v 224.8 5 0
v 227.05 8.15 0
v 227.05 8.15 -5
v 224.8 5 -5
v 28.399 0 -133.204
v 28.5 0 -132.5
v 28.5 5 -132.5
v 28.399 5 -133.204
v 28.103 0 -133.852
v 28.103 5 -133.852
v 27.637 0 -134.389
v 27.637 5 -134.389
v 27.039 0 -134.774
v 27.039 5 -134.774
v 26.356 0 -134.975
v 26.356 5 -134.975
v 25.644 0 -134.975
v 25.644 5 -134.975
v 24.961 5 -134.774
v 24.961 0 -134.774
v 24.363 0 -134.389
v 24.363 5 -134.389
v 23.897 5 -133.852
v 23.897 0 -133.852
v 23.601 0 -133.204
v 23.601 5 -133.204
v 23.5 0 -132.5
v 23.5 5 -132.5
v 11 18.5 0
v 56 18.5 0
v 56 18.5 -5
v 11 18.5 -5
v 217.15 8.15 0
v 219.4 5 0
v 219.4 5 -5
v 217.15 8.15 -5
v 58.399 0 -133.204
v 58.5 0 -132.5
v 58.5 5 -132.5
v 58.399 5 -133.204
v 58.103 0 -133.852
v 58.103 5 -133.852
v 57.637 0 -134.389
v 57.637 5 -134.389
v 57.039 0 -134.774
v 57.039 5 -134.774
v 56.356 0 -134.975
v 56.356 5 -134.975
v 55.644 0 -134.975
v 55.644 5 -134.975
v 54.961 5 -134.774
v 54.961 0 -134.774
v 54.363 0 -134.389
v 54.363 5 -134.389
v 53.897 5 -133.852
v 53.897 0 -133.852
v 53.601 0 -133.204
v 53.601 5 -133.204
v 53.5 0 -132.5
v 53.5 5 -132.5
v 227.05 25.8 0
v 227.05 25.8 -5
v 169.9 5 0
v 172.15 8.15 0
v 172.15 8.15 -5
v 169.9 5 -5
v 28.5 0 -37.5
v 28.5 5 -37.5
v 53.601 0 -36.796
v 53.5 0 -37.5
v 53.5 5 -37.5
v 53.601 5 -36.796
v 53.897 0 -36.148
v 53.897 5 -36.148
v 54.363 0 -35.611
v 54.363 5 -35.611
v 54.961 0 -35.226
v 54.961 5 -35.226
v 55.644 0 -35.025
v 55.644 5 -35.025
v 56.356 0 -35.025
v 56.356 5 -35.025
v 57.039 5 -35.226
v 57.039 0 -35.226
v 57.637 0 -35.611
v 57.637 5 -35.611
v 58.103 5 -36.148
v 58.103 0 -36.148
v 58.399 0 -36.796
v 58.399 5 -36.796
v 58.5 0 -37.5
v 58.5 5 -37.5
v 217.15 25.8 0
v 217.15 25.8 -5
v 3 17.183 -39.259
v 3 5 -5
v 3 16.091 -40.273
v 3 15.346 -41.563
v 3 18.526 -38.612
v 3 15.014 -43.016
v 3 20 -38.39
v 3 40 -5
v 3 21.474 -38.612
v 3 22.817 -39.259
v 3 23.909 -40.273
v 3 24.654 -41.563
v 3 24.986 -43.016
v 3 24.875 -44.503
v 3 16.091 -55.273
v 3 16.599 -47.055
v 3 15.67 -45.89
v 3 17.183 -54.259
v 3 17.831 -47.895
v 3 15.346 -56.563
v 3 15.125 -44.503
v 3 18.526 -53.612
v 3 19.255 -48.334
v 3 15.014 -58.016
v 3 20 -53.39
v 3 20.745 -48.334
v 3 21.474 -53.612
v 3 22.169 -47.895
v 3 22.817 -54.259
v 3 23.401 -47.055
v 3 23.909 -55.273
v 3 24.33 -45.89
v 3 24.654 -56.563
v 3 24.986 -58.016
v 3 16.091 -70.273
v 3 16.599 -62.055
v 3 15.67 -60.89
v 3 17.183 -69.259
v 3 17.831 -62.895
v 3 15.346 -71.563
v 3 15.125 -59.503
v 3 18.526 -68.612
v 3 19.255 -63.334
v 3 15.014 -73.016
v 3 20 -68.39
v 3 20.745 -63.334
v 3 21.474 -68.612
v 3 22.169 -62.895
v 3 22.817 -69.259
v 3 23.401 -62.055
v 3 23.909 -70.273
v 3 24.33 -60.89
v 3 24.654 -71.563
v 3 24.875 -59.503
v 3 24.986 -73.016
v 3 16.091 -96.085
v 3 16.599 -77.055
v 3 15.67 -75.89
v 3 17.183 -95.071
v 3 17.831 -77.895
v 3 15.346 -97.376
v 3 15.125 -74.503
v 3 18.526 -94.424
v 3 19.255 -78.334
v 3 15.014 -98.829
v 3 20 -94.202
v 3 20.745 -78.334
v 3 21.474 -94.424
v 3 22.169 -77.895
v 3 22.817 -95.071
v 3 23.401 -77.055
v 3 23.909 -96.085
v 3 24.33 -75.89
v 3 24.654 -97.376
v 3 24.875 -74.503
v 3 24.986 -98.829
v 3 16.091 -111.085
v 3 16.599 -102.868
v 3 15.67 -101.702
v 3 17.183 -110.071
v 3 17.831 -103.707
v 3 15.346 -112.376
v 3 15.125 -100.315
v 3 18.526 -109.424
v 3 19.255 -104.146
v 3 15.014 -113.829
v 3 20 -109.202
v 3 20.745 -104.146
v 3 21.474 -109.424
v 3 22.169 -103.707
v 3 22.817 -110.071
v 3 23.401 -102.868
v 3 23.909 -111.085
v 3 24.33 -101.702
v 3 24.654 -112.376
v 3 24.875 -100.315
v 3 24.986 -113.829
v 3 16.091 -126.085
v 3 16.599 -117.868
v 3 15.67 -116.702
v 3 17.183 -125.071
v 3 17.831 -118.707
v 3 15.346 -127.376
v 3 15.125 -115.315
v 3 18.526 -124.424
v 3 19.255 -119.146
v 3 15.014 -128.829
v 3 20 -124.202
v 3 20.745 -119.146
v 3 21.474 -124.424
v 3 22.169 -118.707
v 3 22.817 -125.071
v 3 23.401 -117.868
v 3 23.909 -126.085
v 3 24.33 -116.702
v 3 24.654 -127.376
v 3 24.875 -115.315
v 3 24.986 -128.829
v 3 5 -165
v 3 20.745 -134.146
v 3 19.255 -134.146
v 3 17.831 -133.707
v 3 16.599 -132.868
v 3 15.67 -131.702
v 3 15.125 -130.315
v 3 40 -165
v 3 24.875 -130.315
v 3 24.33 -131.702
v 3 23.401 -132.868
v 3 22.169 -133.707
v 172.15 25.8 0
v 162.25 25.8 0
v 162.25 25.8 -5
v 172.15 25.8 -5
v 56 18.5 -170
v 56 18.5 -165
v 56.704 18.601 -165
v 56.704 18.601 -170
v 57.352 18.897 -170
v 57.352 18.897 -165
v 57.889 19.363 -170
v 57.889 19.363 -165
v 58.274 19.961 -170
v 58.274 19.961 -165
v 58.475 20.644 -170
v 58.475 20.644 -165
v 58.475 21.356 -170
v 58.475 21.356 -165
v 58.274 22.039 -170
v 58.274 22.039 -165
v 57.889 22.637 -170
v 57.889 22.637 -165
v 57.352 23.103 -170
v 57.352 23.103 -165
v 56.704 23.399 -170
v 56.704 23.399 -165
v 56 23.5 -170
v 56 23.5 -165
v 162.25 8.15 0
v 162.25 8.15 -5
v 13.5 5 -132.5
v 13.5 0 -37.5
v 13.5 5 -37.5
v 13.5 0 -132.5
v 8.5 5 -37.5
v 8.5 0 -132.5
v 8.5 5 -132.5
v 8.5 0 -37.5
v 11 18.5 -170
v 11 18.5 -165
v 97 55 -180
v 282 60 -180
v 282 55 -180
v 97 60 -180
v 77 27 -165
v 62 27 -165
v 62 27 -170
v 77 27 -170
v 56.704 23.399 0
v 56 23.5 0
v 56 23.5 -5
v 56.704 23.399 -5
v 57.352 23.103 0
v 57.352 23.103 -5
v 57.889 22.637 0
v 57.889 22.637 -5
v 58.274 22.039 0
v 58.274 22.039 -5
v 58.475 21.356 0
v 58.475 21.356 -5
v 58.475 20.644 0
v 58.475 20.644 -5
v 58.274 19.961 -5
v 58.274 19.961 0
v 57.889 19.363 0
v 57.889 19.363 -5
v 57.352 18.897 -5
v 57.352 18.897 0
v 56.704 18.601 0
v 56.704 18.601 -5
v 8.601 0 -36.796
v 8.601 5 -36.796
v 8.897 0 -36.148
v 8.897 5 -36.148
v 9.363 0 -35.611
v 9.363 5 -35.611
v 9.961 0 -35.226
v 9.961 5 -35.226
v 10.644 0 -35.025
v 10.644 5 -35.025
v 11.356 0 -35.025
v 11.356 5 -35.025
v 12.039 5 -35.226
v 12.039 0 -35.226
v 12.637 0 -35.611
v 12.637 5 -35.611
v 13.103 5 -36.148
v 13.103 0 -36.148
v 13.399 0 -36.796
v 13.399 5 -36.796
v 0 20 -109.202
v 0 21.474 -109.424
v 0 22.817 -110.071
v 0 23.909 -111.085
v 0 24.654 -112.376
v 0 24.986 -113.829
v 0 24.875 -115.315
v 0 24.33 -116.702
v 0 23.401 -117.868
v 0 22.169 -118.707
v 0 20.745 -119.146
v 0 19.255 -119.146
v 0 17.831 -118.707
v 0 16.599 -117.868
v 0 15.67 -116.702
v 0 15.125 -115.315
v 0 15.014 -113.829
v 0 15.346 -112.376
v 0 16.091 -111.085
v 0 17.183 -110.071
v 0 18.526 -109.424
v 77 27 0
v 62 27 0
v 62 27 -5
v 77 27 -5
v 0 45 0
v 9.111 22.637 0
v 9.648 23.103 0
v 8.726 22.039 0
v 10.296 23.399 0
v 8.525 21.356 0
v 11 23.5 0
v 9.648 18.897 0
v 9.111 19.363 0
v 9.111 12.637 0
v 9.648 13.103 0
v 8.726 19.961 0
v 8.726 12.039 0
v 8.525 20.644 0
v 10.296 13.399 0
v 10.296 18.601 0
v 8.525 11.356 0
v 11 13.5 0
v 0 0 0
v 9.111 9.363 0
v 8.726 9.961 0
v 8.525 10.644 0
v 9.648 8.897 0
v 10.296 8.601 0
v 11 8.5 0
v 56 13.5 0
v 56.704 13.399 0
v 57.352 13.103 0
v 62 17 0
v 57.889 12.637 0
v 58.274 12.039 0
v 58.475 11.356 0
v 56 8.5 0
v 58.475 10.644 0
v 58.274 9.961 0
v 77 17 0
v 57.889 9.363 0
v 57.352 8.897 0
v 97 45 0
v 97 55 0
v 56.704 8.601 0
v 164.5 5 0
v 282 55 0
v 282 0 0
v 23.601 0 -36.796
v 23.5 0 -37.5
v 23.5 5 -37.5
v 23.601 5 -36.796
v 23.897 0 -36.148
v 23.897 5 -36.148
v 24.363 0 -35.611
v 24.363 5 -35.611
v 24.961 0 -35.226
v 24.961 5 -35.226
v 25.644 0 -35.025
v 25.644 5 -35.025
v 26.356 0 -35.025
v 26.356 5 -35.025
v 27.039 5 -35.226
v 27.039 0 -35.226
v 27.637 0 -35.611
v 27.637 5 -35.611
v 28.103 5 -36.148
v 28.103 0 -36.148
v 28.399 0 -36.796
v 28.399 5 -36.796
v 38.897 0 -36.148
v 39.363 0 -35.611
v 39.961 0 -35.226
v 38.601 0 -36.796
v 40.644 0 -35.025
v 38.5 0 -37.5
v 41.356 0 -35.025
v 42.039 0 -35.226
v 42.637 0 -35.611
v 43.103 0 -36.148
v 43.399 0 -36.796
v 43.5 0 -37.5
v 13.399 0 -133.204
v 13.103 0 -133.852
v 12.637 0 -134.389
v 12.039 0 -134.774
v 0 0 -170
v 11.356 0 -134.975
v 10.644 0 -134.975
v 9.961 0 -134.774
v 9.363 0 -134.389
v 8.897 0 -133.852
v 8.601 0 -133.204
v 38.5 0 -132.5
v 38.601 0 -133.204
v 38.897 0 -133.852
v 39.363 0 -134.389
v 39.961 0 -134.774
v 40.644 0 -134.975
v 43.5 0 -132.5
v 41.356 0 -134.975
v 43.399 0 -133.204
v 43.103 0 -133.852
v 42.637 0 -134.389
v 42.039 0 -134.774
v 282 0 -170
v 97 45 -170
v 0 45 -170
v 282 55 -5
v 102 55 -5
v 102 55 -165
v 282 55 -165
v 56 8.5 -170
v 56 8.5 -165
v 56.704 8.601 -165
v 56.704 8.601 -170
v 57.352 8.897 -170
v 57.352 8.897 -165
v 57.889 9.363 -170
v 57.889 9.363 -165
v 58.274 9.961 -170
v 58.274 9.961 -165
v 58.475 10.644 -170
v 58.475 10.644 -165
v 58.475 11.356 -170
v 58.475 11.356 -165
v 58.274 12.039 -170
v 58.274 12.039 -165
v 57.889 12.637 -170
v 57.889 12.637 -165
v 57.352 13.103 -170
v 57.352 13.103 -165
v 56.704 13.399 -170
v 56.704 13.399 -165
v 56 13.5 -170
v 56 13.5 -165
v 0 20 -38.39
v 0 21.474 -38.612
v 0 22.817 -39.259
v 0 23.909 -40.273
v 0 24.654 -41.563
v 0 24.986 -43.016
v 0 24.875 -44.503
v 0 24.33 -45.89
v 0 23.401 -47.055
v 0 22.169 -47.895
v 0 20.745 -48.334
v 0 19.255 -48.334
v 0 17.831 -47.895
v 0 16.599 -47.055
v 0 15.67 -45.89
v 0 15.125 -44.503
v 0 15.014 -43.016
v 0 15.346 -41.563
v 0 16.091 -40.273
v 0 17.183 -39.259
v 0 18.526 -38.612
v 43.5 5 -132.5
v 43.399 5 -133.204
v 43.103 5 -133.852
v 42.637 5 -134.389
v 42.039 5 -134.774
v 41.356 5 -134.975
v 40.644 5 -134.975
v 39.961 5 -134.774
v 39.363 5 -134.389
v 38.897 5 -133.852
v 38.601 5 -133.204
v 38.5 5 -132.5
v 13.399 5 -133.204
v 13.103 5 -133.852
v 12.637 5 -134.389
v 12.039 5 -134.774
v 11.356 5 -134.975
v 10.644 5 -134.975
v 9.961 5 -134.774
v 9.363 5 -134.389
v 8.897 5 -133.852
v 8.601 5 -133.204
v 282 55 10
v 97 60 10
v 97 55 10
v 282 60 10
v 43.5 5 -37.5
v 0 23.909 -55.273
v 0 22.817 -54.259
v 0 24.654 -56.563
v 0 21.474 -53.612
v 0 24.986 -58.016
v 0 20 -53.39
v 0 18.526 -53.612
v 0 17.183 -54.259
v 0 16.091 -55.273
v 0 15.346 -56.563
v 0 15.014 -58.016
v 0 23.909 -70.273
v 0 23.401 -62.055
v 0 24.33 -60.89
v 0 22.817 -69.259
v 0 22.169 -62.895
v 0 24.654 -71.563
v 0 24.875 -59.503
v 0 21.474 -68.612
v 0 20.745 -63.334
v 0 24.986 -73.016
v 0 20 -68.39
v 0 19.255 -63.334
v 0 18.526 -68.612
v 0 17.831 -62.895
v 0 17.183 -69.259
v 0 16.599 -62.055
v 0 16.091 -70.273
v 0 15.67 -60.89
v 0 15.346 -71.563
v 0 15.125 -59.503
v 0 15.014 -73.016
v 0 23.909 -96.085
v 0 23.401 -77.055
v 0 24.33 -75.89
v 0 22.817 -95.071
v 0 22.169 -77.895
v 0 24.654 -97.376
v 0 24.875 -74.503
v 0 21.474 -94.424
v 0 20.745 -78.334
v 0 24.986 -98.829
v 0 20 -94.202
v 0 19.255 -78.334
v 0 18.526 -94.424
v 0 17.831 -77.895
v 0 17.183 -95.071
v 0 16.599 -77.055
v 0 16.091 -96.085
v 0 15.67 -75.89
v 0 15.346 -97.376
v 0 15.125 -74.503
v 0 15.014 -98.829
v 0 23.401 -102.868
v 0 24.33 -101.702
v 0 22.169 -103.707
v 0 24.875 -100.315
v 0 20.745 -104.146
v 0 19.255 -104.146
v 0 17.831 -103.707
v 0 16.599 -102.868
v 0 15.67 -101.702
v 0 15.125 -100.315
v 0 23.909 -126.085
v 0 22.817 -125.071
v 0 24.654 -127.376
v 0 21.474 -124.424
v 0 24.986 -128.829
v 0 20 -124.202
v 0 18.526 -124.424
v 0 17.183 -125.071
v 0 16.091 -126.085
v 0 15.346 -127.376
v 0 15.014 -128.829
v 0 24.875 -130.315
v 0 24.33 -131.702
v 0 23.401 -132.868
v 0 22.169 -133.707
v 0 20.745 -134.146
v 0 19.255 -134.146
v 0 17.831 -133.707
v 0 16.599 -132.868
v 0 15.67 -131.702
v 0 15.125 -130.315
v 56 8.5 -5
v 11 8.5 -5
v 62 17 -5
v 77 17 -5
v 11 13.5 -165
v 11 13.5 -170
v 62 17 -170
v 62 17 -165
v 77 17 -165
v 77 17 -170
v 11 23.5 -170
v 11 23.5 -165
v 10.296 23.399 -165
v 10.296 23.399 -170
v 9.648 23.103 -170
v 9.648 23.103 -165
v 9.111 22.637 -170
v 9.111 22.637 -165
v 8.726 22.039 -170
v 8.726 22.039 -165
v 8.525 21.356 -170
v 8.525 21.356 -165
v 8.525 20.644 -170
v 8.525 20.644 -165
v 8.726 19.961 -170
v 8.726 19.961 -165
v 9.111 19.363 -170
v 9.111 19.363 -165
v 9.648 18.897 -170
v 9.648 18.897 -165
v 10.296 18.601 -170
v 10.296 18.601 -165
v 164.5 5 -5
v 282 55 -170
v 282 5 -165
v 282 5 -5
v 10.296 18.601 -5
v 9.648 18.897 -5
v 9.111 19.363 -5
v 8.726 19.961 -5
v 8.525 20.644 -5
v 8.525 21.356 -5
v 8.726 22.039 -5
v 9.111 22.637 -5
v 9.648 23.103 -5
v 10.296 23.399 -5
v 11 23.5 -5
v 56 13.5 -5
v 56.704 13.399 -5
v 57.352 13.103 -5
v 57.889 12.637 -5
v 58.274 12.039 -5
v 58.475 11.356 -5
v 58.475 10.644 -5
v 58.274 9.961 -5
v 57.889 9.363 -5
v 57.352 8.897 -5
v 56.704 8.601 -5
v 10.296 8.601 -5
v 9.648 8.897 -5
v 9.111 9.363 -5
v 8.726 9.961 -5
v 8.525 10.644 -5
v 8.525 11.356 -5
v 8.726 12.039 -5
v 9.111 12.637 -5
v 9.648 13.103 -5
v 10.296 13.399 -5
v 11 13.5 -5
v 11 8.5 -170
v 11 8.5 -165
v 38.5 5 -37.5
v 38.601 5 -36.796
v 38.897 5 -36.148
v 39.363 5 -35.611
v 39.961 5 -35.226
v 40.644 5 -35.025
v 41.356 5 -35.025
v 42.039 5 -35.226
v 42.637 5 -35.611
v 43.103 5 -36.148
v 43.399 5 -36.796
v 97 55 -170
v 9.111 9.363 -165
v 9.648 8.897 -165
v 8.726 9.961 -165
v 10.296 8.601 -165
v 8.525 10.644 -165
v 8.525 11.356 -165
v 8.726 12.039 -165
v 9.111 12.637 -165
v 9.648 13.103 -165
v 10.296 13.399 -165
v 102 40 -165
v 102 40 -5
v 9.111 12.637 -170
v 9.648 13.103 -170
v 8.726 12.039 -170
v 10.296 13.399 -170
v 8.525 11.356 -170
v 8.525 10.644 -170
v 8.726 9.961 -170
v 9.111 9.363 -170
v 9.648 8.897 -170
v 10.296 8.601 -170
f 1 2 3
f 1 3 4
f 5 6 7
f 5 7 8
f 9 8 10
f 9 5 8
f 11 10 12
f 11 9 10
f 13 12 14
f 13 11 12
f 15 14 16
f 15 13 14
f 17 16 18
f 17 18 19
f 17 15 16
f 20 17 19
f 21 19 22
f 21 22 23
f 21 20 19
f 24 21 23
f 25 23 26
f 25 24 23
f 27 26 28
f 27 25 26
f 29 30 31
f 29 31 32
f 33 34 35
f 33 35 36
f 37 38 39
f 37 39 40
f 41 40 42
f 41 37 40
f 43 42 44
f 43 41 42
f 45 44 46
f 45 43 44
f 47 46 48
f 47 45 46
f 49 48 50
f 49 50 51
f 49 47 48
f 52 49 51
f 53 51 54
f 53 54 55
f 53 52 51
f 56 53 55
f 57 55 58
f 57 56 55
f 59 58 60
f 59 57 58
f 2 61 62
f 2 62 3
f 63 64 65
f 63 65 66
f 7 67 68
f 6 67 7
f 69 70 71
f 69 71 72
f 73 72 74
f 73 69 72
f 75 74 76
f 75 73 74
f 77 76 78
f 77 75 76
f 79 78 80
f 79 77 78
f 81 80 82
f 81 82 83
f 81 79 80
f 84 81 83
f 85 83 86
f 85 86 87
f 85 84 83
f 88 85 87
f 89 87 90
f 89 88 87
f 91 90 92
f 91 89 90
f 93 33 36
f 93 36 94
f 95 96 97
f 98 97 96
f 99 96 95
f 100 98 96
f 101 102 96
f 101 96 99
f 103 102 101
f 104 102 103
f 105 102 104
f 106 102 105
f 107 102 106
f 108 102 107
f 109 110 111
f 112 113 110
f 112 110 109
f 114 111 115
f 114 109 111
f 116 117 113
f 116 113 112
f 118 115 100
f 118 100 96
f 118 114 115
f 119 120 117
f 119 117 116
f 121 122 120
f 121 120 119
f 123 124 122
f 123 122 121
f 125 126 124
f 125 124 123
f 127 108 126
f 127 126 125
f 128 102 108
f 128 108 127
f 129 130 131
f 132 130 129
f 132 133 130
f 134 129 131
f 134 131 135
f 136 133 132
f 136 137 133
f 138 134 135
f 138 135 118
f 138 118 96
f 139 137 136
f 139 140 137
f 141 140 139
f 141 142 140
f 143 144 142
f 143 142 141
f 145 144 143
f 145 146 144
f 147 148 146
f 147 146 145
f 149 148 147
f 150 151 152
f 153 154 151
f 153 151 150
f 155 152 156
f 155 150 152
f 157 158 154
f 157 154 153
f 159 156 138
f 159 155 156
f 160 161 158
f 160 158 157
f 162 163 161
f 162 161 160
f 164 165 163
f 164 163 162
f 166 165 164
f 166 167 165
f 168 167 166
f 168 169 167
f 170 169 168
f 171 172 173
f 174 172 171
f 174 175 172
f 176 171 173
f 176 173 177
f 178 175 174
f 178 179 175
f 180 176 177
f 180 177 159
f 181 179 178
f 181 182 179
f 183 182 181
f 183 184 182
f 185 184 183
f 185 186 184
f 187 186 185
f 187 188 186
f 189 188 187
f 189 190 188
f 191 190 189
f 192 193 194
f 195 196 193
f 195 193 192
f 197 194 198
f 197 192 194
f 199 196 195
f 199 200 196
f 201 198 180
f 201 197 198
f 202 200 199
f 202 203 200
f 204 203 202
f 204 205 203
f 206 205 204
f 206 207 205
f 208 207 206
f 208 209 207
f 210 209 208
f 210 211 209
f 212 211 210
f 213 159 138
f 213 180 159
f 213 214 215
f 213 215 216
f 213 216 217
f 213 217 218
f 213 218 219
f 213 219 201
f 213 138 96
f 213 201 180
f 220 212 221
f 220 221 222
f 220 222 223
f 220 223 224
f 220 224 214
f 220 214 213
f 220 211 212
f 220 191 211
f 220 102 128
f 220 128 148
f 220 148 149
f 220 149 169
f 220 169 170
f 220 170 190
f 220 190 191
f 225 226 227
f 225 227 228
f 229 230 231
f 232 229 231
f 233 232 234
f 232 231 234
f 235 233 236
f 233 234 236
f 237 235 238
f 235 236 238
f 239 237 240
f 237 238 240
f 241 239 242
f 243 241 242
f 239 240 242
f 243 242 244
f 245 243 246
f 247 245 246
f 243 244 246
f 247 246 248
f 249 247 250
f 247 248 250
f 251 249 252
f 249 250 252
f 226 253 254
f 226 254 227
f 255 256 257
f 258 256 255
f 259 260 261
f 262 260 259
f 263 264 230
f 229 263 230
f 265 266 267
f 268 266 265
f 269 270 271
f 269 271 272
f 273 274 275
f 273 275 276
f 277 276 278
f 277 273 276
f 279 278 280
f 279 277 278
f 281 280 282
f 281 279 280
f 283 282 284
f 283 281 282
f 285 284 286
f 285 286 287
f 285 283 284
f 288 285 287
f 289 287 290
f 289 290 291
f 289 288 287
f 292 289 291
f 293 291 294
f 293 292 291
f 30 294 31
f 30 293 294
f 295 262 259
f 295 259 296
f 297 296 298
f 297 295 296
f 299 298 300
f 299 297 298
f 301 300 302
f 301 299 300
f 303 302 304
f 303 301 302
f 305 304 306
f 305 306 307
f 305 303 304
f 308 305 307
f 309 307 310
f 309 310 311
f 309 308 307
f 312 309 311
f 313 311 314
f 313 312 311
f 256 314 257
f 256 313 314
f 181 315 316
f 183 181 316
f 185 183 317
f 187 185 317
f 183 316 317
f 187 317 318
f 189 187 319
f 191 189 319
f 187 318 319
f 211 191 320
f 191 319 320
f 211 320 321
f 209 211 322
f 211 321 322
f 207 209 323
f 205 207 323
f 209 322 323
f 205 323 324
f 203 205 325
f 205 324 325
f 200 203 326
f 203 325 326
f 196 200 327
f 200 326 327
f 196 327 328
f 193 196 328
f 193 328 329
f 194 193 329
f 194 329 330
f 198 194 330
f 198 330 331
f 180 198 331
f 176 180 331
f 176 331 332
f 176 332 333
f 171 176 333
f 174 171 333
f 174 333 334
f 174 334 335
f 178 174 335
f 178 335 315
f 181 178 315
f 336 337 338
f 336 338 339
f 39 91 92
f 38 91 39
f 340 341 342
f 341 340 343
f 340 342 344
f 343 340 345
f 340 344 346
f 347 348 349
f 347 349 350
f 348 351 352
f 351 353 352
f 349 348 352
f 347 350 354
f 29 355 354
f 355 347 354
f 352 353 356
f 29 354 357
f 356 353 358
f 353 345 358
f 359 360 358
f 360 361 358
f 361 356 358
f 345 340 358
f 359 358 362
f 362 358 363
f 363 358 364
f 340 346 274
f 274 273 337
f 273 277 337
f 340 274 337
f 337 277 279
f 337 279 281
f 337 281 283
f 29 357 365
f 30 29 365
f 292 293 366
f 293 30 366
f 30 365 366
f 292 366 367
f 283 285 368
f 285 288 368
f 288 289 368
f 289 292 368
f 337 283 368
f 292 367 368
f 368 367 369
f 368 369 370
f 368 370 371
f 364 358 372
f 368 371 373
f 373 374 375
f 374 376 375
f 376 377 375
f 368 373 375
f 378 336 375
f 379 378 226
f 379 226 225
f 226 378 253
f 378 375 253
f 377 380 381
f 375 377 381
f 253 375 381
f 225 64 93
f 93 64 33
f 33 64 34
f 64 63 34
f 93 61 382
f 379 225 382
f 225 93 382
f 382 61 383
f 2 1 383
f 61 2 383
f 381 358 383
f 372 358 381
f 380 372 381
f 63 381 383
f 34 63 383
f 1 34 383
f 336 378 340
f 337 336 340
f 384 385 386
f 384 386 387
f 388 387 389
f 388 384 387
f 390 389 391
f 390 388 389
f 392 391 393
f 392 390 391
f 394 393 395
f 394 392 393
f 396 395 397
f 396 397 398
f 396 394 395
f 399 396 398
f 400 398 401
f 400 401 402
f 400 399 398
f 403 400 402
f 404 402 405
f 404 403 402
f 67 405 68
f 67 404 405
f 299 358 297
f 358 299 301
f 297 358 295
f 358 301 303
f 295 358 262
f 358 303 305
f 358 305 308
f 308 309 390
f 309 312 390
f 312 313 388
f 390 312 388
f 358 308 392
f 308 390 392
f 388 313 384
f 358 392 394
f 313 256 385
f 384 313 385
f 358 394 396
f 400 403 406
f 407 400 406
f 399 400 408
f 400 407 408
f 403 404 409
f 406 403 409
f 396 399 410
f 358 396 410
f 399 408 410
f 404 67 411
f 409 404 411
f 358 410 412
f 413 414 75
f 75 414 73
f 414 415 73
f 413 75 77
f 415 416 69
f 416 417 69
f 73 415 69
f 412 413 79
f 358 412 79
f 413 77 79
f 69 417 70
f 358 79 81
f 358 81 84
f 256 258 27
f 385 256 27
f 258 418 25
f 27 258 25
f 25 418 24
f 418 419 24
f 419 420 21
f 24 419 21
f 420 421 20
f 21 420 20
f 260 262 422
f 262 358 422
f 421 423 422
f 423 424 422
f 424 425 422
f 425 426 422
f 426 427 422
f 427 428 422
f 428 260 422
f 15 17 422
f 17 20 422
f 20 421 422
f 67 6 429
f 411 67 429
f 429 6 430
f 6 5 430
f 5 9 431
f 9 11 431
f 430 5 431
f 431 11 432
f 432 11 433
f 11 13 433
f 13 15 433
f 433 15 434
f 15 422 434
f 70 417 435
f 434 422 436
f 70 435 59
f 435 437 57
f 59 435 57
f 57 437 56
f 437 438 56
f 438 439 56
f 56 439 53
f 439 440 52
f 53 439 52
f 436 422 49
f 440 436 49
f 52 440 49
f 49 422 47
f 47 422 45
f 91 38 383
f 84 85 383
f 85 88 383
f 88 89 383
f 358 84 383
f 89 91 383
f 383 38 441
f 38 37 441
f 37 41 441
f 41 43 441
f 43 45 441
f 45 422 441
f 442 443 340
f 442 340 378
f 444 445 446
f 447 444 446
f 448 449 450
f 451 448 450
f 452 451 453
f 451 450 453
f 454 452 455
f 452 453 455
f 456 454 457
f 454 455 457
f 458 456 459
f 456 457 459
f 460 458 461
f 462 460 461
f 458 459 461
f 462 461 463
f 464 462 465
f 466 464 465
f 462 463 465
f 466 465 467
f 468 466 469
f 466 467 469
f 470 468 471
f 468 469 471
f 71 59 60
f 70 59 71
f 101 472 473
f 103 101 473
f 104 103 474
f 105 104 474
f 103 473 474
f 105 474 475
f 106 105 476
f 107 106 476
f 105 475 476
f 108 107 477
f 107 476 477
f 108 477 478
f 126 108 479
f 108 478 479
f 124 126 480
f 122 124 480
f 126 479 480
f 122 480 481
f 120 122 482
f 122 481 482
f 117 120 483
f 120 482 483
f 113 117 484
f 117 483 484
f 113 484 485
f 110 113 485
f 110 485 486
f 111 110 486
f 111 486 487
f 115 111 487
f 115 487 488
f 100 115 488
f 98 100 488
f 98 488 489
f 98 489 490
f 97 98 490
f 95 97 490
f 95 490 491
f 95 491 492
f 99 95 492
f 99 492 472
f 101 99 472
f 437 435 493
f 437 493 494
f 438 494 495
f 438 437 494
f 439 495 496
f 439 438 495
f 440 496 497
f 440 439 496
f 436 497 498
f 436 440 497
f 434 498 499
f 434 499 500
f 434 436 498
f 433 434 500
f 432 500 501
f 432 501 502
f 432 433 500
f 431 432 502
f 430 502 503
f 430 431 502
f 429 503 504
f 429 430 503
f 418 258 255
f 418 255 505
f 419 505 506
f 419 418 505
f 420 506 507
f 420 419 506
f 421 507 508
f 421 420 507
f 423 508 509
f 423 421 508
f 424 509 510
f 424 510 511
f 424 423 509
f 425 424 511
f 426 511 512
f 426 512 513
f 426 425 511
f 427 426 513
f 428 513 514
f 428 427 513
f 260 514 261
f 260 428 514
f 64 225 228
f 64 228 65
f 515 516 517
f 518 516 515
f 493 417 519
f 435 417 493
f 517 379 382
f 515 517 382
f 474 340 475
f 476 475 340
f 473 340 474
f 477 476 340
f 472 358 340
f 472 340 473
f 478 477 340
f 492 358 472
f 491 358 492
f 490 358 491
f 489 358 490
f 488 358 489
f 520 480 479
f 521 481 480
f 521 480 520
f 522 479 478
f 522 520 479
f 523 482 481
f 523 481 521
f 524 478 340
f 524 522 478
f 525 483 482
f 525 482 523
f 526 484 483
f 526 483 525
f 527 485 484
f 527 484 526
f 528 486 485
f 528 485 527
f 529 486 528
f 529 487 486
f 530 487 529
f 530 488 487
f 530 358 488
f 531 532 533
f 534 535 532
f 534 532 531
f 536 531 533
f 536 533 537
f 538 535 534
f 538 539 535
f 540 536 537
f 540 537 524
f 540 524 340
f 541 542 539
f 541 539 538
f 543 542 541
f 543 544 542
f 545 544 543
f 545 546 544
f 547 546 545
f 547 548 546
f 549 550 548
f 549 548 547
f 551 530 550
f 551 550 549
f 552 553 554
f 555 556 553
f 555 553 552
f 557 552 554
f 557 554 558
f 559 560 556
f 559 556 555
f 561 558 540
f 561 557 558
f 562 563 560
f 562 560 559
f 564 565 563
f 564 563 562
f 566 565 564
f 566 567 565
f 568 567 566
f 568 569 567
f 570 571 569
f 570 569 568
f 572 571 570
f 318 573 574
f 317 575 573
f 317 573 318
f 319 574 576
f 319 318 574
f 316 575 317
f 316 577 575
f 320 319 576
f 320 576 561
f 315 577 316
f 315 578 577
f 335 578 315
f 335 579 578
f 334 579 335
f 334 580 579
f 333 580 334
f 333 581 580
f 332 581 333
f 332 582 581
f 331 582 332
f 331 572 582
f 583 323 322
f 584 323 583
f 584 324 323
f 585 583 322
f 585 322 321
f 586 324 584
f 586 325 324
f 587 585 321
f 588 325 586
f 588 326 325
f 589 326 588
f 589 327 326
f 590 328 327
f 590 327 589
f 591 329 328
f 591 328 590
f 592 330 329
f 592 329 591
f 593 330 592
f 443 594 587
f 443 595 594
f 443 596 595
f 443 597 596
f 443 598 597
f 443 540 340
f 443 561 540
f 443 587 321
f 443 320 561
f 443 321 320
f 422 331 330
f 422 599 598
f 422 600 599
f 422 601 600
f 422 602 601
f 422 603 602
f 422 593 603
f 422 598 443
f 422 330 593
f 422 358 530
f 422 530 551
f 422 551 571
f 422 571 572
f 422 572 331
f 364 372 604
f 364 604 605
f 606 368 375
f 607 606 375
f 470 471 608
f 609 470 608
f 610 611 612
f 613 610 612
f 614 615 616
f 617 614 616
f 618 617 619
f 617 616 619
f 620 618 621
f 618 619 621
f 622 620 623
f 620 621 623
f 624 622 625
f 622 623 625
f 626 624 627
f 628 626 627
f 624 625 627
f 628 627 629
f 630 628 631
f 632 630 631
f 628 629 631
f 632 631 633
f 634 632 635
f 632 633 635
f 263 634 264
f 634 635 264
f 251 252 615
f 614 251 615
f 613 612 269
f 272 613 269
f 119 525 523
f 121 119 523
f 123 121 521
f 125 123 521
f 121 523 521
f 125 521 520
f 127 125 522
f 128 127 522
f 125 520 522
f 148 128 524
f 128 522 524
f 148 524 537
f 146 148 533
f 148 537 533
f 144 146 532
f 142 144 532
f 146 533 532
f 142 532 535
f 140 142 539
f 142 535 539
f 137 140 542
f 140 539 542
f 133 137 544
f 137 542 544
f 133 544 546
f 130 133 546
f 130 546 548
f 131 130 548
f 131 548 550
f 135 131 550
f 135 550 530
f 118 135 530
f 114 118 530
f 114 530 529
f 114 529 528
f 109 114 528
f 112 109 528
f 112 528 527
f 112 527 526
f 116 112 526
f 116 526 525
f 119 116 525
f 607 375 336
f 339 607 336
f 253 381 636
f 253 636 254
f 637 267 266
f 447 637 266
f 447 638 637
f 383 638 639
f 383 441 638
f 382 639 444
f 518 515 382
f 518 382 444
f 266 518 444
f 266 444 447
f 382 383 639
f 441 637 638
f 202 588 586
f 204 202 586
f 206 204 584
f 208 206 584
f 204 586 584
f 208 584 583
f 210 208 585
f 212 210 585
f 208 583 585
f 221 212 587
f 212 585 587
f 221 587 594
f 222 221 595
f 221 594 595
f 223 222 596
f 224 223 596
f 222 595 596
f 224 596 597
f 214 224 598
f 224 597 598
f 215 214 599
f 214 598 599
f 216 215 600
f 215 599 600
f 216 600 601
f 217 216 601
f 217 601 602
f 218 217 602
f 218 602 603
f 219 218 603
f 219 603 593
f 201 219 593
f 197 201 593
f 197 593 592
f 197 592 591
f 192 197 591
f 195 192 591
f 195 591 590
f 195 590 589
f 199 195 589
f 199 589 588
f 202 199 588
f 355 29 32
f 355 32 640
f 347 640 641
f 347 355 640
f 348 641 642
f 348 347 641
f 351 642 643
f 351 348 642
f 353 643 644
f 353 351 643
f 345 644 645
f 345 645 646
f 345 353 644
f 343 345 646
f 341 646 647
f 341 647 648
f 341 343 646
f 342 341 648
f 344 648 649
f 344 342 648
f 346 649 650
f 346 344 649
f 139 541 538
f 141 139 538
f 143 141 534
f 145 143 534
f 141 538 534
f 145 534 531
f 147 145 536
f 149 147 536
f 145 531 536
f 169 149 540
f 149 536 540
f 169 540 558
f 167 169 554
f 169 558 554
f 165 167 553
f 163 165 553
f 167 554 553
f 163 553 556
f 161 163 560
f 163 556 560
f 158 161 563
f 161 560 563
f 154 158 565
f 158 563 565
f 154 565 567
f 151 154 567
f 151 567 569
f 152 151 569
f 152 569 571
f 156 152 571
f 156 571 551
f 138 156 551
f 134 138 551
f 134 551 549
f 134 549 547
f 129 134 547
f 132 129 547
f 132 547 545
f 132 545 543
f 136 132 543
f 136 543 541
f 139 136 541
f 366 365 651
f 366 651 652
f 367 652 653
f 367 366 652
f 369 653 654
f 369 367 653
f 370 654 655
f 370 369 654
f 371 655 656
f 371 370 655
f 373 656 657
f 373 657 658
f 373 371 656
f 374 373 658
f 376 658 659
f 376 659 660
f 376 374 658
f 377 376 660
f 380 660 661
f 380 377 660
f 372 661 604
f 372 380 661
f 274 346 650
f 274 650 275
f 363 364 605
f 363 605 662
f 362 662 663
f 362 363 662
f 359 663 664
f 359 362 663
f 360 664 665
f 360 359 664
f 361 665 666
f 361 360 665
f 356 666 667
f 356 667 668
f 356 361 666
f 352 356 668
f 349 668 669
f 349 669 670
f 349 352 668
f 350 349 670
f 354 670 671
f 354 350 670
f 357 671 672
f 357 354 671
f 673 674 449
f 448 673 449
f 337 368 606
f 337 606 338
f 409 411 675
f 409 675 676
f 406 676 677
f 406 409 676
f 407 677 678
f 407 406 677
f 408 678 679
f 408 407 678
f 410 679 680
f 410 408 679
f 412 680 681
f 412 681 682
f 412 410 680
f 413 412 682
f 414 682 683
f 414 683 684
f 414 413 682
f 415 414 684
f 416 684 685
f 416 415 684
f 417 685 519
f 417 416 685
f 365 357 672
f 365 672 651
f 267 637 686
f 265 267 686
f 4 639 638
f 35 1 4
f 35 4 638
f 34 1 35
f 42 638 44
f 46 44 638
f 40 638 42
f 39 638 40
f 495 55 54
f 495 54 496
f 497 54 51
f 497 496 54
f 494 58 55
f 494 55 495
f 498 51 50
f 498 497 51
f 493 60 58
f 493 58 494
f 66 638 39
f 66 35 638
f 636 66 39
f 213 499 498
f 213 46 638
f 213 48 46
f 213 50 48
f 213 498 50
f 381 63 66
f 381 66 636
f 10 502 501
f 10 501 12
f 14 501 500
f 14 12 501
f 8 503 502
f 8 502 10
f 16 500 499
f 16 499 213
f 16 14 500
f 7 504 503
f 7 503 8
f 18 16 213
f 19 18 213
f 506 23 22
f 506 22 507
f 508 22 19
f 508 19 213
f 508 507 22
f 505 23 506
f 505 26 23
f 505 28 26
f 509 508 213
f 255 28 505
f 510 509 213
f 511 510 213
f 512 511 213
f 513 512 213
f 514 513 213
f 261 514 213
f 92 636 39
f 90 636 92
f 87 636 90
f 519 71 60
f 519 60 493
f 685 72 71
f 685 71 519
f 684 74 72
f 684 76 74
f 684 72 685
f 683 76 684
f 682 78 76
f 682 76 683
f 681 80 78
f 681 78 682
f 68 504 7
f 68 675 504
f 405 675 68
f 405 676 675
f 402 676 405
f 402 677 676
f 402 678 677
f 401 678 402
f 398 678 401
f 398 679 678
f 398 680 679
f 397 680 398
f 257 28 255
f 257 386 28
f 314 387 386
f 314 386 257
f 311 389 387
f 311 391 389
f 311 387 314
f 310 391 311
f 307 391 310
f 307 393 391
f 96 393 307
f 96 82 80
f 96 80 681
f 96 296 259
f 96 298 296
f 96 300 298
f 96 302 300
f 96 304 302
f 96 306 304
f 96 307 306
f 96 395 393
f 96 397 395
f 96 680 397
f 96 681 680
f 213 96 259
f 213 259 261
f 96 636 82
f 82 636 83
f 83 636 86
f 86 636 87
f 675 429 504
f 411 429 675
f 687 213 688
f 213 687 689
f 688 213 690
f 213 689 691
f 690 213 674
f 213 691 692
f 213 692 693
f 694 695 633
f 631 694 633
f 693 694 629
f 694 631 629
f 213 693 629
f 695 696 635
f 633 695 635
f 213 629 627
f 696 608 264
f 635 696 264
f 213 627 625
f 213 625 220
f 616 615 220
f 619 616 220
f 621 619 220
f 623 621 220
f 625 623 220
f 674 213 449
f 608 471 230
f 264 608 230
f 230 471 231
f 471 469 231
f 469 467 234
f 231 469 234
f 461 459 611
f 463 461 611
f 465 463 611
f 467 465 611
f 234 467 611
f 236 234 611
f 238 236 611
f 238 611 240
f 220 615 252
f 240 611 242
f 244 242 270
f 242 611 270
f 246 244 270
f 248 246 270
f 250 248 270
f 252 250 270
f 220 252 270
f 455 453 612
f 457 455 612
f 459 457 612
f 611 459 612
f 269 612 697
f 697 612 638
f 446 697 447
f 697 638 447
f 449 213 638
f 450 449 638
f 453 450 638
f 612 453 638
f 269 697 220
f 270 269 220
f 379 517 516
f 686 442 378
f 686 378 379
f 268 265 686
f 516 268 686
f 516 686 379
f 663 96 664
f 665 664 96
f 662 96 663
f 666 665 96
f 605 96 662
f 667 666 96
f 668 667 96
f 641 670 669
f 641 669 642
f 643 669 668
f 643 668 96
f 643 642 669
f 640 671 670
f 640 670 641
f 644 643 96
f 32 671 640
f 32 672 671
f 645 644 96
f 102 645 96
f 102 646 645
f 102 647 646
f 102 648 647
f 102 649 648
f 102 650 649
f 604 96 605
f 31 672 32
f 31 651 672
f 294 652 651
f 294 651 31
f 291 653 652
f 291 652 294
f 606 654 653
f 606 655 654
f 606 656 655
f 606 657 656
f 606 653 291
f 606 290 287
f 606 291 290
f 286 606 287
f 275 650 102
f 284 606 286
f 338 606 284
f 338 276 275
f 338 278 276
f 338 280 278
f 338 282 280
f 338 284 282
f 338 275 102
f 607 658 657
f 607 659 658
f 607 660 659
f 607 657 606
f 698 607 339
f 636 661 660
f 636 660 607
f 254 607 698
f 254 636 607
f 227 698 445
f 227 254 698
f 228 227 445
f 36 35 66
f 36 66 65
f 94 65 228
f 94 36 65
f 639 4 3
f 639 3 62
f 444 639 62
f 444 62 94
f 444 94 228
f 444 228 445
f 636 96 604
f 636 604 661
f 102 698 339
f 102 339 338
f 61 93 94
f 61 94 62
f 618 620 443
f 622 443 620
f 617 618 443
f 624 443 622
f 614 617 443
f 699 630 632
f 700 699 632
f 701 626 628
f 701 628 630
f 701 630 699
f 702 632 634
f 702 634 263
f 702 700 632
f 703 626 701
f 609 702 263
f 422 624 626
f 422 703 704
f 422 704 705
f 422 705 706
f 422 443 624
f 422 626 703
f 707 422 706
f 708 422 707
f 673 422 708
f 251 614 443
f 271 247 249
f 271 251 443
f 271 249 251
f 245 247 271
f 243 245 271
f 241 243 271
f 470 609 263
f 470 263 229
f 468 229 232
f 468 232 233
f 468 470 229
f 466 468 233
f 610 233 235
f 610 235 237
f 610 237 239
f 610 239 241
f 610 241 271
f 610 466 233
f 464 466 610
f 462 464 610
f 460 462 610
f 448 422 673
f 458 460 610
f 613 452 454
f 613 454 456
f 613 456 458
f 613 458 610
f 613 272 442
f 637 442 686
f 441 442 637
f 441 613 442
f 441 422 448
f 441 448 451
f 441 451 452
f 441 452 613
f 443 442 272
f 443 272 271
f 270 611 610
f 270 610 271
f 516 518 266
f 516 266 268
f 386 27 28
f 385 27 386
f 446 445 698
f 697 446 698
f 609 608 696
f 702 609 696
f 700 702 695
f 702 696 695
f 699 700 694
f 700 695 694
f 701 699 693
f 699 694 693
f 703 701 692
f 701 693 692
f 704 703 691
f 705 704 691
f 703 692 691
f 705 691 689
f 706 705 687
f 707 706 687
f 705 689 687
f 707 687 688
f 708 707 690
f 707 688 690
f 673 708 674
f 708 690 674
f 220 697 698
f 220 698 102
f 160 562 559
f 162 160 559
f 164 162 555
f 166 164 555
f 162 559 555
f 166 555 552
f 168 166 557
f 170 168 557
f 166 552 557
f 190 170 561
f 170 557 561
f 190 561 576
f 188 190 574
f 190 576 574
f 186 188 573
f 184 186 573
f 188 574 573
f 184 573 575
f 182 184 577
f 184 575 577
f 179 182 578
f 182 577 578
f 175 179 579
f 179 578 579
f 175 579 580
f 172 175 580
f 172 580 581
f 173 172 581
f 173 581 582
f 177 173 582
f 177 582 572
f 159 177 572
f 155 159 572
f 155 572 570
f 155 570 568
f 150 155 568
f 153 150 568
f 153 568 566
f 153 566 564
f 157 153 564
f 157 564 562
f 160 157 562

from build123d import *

# Parameters (mm, degrees)
SKETCH1_W           = 282
SKETCH1_H           = 170
BOSS_EXTRUDE1_DEPTH = 60
CUT_EXTRUDE4_DEPTH  = 5
SKETCH8_W           = 160
SKETCH8_H           = 50
CUT_EXTRUDE5_DEPTH  = 279
CUT_EXTRUDE6_DEPTH  = 5
SKETCH10_R          = 5
CUT_EXTRUDE7_DEPTH  = 5
CUT_EXTRUDE8_DEPTH  = 5
CUT_EXTRUDE9_START  = -5
CUT_EXTRUDE9_DEPTH  = 5
SKETCH14_W          = 185
SKETCH14_H          = 5
BOSS_EXTRUDE2_DEPTH = 10
SKETCH15_W          = 185
SKETCH15_H          = 5
BOSS_EXTRUDE3_DEPTH = 10
SKETCH16_W          = 97
SKETCH16_H          = 15
CUT_EXTRUDE10_DEPTH = 170
BOSS_EXTRUDE4_DEPTH = 160
SKETCH18_W          = 15
SKETCH18_H          = 10
CUT_EXTRUDE11_DEPTH = 340.888216918


with BuildPart() as part:
    # Sketch1 → Boss-Extrude1 (new body)
    with BuildSketch(Plane(origin=(0, 0, 0), x_dir=(1, 0, 0), z_dir=(0, 1, 0))):
        with Locations((141, 85)):
            Rectangle(SKETCH1_W, SKETCH1_H)
    extrude(amount=BOSS_EXTRUDE1_DEPTH)

    # Sketch7 → Cut-Extrude4 (cut)
    with BuildSketch(Plane.XZ):
        with BuildLine():
            Line((13.5, -37.5), (13.5, -132.5))
            ThreePointArc((13.5, -132.5), (11, -135), (8.5, -132.5))
            Line((8.5, -132.5), (8.5, -37.5))
            ThreePointArc((8.5, -37.5), (11, -35), (13.5, -37.5))
        make_face()
        with BuildLine():
            Line((58.5, -37.5), (58.5, -132.5))
            ThreePointArc((58.5, -132.5), (56, -135), (53.5, -132.5))
            Line((53.5, -132.5), (53.5, -37.5))
            ThreePointArc((53.5, -37.5), (56, -35), (58.5, -37.5))
        make_face()
        with BuildLine():
            Line((28.5, -37.5), (28.5, -132.5))
            ThreePointArc((28.5, -132.5), (26, -135), (23.5, -132.5))
            Line((23.5, -132.5), (23.5, -37.5))
            ThreePointArc((23.5, -37.5), (26, -35), (28.5, -37.5))
        make_face()
        with BuildLine():
            Line((43.5, -37.5), (43.5, -132.5))
            ThreePointArc((43.5, -132.5), (41, -135), (38.5, -132.5))
            Line((38.5, -132.5), (38.5, -37.5))
            ThreePointArc((38.5, -37.5), (41, -35), (43.5, -37.5))
        make_face()
    extrude(amount=-CUT_EXTRUDE4_DEPTH, mode=Mode.SUBTRACT)

    # Sketch8 → Cut-Extrude5 (cut)
    with BuildSketch(Plane(origin=(282, 0, 0), x_dir=(0, 0, -1), z_dir=(1, 0, 0))):
        with Locations((85, 30)):
            Rectangle(SKETCH8_W, SKETCH8_H)
    extrude(amount=-CUT_EXTRUDE5_DEPTH, mode=Mode.SUBTRACT)

    # Sketch9 → Cut-Extrude6 (cut)
    with BuildSketch(Plane.XY):
        Polygon((217.15, 25.8), (227.05, 25.8), (227.05, 8.15), (224.8, 5), (219.4, 5), (217.15, 8.15), align=None)
        Polygon((162.25, 25.8), (172.15, 25.8), (172.15, 8.15), (169.9, 5), (164.5, 5), (162.25, 8.15), align=None)
    extrude(amount=-CUT_EXTRUDE6_DEPTH, mode=Mode.SUBTRACT)

    # Sketch10 → Cut-Extrude7 (cut)
    with BuildSketch(Plane.ZY):
        with Locations((-129.202249563, 20)):
            Circle(SKETCH10_R)
        with Locations((-114.202249563, 20)):
            Circle(SKETCH10_R)
        with Locations((-99.202249563, 20)):
            Circle(SKETCH10_R)
        with Locations((-43.390057257, 20)):
            Circle(SKETCH10_R)
        with Locations((-58.390057257, 20)):
            Circle(SKETCH10_R)
        with Locations((-73.390057257, 20)):
            Circle(SKETCH10_R)
    extrude(amount=-CUT_EXTRUDE7_DEPTH, mode=Mode.SUBTRACT)

    # Sketch11 → Cut-Extrude8 (cut)
    with BuildSketch(Plane.XY):
        with BuildLine():
            Line((11, 13.5), (56, 13.5))
            ThreePointArc((56, 13.5), (58.5, 11), (56, 8.5))
            Line((56, 8.5), (11, 8.5))
            ThreePointArc((11, 8.5), (8.5, 11), (11, 13.5))
        make_face()
        with BuildLine():
            Line((11, 23.5), (56, 23.5))
            ThreePointArc((56, 23.5), (58.5, 21), (56, 18.5))
            Line((56, 18.5), (11, 18.5))
            ThreePointArc((11, 18.5), (8.5, 21), (11, 23.5))
        make_face()
    extrude(amount=-CUT_EXTRUDE8_DEPTH, mode=Mode.SUBTRACT)

    # Sketch12 → Cut-Extrude9 (cut)
    with BuildSketch(Plane(origin=(0, 0, -170), x_dir=(-1, 0, 0), z_dir=(0, 0, -1)).offset(CUT_EXTRUDE9_START)):
        with BuildLine():
            Line((-56, 13.5), (-11, 13.5))
            ThreePointArc((-11, 13.5), (-8.5, 11), (-11, 8.5))
            Line((-11, 8.5), (-56, 8.5))
            ThreePointArc((-56, 8.5), (-58.5, 11), (-56, 13.5))
        make_face()
        with BuildLine():
            Line((-56, 23.5), (-11, 23.5))
            ThreePointArc((-11, 23.5), (-8.5, 21), (-11, 18.5))
            Line((-11, 18.5), (-56, 18.5))
            ThreePointArc((-56, 18.5), (-58.5, 21), (-56, 23.5))
        make_face()
    extrude(amount=CUT_EXTRUDE9_DEPTH, mode=Mode.SUBTRACT)

    # Sketch14 → Boss-Extrude2 (add)
    with BuildSketch(Plane.XY):
        with Locations((189.5, 57.5)):
            Rectangle(SKETCH14_W, SKETCH14_H)
    extrude(amount=BOSS_EXTRUDE2_DEPTH)

    # Sketch15 → Boss-Extrude3 (add)
    with BuildSketch(Plane(origin=(0, 0, -170), x_dir=(-1, 0, 0), z_dir=(0, 0, -1))):
        with Locations((-189.5, 57.5)):
            Rectangle(SKETCH15_W, SKETCH15_H)
    extrude(amount=BOSS_EXTRUDE3_DEPTH)

    # Sketch16 → Cut-Extrude10 (cut)
    with BuildSketch(Plane.XY):
        with Locations((48.5, 52.5)):
            Rectangle(SKETCH16_W, SKETCH16_H)
    extrude(amount=-CUT_EXTRUDE10_DEPTH, mode=Mode.SUBTRACT)

    # Sketch17 → Boss-Extrude4 (add)
    with BuildSketch(Plane.XY.offset(-165)):
        Polygon((3, 45), (97, 45), (97, 55), (102, 55), (102, 40), (3, 40), align=None)
    extrude(amount=BOSS_EXTRUDE4_DEPTH)

    # Sketch18 → Cut-Extrude11 (cut, through all)
    with BuildSketch(Plane.XY):
        with Locations((69.5, 22)):
            Rectangle(SKETCH18_W, SKETCH18_H)
    extrude(amount=-CUT_EXTRUDE11_DEPTH, mode=Mode.SUBTRACT)


solid = part.part
